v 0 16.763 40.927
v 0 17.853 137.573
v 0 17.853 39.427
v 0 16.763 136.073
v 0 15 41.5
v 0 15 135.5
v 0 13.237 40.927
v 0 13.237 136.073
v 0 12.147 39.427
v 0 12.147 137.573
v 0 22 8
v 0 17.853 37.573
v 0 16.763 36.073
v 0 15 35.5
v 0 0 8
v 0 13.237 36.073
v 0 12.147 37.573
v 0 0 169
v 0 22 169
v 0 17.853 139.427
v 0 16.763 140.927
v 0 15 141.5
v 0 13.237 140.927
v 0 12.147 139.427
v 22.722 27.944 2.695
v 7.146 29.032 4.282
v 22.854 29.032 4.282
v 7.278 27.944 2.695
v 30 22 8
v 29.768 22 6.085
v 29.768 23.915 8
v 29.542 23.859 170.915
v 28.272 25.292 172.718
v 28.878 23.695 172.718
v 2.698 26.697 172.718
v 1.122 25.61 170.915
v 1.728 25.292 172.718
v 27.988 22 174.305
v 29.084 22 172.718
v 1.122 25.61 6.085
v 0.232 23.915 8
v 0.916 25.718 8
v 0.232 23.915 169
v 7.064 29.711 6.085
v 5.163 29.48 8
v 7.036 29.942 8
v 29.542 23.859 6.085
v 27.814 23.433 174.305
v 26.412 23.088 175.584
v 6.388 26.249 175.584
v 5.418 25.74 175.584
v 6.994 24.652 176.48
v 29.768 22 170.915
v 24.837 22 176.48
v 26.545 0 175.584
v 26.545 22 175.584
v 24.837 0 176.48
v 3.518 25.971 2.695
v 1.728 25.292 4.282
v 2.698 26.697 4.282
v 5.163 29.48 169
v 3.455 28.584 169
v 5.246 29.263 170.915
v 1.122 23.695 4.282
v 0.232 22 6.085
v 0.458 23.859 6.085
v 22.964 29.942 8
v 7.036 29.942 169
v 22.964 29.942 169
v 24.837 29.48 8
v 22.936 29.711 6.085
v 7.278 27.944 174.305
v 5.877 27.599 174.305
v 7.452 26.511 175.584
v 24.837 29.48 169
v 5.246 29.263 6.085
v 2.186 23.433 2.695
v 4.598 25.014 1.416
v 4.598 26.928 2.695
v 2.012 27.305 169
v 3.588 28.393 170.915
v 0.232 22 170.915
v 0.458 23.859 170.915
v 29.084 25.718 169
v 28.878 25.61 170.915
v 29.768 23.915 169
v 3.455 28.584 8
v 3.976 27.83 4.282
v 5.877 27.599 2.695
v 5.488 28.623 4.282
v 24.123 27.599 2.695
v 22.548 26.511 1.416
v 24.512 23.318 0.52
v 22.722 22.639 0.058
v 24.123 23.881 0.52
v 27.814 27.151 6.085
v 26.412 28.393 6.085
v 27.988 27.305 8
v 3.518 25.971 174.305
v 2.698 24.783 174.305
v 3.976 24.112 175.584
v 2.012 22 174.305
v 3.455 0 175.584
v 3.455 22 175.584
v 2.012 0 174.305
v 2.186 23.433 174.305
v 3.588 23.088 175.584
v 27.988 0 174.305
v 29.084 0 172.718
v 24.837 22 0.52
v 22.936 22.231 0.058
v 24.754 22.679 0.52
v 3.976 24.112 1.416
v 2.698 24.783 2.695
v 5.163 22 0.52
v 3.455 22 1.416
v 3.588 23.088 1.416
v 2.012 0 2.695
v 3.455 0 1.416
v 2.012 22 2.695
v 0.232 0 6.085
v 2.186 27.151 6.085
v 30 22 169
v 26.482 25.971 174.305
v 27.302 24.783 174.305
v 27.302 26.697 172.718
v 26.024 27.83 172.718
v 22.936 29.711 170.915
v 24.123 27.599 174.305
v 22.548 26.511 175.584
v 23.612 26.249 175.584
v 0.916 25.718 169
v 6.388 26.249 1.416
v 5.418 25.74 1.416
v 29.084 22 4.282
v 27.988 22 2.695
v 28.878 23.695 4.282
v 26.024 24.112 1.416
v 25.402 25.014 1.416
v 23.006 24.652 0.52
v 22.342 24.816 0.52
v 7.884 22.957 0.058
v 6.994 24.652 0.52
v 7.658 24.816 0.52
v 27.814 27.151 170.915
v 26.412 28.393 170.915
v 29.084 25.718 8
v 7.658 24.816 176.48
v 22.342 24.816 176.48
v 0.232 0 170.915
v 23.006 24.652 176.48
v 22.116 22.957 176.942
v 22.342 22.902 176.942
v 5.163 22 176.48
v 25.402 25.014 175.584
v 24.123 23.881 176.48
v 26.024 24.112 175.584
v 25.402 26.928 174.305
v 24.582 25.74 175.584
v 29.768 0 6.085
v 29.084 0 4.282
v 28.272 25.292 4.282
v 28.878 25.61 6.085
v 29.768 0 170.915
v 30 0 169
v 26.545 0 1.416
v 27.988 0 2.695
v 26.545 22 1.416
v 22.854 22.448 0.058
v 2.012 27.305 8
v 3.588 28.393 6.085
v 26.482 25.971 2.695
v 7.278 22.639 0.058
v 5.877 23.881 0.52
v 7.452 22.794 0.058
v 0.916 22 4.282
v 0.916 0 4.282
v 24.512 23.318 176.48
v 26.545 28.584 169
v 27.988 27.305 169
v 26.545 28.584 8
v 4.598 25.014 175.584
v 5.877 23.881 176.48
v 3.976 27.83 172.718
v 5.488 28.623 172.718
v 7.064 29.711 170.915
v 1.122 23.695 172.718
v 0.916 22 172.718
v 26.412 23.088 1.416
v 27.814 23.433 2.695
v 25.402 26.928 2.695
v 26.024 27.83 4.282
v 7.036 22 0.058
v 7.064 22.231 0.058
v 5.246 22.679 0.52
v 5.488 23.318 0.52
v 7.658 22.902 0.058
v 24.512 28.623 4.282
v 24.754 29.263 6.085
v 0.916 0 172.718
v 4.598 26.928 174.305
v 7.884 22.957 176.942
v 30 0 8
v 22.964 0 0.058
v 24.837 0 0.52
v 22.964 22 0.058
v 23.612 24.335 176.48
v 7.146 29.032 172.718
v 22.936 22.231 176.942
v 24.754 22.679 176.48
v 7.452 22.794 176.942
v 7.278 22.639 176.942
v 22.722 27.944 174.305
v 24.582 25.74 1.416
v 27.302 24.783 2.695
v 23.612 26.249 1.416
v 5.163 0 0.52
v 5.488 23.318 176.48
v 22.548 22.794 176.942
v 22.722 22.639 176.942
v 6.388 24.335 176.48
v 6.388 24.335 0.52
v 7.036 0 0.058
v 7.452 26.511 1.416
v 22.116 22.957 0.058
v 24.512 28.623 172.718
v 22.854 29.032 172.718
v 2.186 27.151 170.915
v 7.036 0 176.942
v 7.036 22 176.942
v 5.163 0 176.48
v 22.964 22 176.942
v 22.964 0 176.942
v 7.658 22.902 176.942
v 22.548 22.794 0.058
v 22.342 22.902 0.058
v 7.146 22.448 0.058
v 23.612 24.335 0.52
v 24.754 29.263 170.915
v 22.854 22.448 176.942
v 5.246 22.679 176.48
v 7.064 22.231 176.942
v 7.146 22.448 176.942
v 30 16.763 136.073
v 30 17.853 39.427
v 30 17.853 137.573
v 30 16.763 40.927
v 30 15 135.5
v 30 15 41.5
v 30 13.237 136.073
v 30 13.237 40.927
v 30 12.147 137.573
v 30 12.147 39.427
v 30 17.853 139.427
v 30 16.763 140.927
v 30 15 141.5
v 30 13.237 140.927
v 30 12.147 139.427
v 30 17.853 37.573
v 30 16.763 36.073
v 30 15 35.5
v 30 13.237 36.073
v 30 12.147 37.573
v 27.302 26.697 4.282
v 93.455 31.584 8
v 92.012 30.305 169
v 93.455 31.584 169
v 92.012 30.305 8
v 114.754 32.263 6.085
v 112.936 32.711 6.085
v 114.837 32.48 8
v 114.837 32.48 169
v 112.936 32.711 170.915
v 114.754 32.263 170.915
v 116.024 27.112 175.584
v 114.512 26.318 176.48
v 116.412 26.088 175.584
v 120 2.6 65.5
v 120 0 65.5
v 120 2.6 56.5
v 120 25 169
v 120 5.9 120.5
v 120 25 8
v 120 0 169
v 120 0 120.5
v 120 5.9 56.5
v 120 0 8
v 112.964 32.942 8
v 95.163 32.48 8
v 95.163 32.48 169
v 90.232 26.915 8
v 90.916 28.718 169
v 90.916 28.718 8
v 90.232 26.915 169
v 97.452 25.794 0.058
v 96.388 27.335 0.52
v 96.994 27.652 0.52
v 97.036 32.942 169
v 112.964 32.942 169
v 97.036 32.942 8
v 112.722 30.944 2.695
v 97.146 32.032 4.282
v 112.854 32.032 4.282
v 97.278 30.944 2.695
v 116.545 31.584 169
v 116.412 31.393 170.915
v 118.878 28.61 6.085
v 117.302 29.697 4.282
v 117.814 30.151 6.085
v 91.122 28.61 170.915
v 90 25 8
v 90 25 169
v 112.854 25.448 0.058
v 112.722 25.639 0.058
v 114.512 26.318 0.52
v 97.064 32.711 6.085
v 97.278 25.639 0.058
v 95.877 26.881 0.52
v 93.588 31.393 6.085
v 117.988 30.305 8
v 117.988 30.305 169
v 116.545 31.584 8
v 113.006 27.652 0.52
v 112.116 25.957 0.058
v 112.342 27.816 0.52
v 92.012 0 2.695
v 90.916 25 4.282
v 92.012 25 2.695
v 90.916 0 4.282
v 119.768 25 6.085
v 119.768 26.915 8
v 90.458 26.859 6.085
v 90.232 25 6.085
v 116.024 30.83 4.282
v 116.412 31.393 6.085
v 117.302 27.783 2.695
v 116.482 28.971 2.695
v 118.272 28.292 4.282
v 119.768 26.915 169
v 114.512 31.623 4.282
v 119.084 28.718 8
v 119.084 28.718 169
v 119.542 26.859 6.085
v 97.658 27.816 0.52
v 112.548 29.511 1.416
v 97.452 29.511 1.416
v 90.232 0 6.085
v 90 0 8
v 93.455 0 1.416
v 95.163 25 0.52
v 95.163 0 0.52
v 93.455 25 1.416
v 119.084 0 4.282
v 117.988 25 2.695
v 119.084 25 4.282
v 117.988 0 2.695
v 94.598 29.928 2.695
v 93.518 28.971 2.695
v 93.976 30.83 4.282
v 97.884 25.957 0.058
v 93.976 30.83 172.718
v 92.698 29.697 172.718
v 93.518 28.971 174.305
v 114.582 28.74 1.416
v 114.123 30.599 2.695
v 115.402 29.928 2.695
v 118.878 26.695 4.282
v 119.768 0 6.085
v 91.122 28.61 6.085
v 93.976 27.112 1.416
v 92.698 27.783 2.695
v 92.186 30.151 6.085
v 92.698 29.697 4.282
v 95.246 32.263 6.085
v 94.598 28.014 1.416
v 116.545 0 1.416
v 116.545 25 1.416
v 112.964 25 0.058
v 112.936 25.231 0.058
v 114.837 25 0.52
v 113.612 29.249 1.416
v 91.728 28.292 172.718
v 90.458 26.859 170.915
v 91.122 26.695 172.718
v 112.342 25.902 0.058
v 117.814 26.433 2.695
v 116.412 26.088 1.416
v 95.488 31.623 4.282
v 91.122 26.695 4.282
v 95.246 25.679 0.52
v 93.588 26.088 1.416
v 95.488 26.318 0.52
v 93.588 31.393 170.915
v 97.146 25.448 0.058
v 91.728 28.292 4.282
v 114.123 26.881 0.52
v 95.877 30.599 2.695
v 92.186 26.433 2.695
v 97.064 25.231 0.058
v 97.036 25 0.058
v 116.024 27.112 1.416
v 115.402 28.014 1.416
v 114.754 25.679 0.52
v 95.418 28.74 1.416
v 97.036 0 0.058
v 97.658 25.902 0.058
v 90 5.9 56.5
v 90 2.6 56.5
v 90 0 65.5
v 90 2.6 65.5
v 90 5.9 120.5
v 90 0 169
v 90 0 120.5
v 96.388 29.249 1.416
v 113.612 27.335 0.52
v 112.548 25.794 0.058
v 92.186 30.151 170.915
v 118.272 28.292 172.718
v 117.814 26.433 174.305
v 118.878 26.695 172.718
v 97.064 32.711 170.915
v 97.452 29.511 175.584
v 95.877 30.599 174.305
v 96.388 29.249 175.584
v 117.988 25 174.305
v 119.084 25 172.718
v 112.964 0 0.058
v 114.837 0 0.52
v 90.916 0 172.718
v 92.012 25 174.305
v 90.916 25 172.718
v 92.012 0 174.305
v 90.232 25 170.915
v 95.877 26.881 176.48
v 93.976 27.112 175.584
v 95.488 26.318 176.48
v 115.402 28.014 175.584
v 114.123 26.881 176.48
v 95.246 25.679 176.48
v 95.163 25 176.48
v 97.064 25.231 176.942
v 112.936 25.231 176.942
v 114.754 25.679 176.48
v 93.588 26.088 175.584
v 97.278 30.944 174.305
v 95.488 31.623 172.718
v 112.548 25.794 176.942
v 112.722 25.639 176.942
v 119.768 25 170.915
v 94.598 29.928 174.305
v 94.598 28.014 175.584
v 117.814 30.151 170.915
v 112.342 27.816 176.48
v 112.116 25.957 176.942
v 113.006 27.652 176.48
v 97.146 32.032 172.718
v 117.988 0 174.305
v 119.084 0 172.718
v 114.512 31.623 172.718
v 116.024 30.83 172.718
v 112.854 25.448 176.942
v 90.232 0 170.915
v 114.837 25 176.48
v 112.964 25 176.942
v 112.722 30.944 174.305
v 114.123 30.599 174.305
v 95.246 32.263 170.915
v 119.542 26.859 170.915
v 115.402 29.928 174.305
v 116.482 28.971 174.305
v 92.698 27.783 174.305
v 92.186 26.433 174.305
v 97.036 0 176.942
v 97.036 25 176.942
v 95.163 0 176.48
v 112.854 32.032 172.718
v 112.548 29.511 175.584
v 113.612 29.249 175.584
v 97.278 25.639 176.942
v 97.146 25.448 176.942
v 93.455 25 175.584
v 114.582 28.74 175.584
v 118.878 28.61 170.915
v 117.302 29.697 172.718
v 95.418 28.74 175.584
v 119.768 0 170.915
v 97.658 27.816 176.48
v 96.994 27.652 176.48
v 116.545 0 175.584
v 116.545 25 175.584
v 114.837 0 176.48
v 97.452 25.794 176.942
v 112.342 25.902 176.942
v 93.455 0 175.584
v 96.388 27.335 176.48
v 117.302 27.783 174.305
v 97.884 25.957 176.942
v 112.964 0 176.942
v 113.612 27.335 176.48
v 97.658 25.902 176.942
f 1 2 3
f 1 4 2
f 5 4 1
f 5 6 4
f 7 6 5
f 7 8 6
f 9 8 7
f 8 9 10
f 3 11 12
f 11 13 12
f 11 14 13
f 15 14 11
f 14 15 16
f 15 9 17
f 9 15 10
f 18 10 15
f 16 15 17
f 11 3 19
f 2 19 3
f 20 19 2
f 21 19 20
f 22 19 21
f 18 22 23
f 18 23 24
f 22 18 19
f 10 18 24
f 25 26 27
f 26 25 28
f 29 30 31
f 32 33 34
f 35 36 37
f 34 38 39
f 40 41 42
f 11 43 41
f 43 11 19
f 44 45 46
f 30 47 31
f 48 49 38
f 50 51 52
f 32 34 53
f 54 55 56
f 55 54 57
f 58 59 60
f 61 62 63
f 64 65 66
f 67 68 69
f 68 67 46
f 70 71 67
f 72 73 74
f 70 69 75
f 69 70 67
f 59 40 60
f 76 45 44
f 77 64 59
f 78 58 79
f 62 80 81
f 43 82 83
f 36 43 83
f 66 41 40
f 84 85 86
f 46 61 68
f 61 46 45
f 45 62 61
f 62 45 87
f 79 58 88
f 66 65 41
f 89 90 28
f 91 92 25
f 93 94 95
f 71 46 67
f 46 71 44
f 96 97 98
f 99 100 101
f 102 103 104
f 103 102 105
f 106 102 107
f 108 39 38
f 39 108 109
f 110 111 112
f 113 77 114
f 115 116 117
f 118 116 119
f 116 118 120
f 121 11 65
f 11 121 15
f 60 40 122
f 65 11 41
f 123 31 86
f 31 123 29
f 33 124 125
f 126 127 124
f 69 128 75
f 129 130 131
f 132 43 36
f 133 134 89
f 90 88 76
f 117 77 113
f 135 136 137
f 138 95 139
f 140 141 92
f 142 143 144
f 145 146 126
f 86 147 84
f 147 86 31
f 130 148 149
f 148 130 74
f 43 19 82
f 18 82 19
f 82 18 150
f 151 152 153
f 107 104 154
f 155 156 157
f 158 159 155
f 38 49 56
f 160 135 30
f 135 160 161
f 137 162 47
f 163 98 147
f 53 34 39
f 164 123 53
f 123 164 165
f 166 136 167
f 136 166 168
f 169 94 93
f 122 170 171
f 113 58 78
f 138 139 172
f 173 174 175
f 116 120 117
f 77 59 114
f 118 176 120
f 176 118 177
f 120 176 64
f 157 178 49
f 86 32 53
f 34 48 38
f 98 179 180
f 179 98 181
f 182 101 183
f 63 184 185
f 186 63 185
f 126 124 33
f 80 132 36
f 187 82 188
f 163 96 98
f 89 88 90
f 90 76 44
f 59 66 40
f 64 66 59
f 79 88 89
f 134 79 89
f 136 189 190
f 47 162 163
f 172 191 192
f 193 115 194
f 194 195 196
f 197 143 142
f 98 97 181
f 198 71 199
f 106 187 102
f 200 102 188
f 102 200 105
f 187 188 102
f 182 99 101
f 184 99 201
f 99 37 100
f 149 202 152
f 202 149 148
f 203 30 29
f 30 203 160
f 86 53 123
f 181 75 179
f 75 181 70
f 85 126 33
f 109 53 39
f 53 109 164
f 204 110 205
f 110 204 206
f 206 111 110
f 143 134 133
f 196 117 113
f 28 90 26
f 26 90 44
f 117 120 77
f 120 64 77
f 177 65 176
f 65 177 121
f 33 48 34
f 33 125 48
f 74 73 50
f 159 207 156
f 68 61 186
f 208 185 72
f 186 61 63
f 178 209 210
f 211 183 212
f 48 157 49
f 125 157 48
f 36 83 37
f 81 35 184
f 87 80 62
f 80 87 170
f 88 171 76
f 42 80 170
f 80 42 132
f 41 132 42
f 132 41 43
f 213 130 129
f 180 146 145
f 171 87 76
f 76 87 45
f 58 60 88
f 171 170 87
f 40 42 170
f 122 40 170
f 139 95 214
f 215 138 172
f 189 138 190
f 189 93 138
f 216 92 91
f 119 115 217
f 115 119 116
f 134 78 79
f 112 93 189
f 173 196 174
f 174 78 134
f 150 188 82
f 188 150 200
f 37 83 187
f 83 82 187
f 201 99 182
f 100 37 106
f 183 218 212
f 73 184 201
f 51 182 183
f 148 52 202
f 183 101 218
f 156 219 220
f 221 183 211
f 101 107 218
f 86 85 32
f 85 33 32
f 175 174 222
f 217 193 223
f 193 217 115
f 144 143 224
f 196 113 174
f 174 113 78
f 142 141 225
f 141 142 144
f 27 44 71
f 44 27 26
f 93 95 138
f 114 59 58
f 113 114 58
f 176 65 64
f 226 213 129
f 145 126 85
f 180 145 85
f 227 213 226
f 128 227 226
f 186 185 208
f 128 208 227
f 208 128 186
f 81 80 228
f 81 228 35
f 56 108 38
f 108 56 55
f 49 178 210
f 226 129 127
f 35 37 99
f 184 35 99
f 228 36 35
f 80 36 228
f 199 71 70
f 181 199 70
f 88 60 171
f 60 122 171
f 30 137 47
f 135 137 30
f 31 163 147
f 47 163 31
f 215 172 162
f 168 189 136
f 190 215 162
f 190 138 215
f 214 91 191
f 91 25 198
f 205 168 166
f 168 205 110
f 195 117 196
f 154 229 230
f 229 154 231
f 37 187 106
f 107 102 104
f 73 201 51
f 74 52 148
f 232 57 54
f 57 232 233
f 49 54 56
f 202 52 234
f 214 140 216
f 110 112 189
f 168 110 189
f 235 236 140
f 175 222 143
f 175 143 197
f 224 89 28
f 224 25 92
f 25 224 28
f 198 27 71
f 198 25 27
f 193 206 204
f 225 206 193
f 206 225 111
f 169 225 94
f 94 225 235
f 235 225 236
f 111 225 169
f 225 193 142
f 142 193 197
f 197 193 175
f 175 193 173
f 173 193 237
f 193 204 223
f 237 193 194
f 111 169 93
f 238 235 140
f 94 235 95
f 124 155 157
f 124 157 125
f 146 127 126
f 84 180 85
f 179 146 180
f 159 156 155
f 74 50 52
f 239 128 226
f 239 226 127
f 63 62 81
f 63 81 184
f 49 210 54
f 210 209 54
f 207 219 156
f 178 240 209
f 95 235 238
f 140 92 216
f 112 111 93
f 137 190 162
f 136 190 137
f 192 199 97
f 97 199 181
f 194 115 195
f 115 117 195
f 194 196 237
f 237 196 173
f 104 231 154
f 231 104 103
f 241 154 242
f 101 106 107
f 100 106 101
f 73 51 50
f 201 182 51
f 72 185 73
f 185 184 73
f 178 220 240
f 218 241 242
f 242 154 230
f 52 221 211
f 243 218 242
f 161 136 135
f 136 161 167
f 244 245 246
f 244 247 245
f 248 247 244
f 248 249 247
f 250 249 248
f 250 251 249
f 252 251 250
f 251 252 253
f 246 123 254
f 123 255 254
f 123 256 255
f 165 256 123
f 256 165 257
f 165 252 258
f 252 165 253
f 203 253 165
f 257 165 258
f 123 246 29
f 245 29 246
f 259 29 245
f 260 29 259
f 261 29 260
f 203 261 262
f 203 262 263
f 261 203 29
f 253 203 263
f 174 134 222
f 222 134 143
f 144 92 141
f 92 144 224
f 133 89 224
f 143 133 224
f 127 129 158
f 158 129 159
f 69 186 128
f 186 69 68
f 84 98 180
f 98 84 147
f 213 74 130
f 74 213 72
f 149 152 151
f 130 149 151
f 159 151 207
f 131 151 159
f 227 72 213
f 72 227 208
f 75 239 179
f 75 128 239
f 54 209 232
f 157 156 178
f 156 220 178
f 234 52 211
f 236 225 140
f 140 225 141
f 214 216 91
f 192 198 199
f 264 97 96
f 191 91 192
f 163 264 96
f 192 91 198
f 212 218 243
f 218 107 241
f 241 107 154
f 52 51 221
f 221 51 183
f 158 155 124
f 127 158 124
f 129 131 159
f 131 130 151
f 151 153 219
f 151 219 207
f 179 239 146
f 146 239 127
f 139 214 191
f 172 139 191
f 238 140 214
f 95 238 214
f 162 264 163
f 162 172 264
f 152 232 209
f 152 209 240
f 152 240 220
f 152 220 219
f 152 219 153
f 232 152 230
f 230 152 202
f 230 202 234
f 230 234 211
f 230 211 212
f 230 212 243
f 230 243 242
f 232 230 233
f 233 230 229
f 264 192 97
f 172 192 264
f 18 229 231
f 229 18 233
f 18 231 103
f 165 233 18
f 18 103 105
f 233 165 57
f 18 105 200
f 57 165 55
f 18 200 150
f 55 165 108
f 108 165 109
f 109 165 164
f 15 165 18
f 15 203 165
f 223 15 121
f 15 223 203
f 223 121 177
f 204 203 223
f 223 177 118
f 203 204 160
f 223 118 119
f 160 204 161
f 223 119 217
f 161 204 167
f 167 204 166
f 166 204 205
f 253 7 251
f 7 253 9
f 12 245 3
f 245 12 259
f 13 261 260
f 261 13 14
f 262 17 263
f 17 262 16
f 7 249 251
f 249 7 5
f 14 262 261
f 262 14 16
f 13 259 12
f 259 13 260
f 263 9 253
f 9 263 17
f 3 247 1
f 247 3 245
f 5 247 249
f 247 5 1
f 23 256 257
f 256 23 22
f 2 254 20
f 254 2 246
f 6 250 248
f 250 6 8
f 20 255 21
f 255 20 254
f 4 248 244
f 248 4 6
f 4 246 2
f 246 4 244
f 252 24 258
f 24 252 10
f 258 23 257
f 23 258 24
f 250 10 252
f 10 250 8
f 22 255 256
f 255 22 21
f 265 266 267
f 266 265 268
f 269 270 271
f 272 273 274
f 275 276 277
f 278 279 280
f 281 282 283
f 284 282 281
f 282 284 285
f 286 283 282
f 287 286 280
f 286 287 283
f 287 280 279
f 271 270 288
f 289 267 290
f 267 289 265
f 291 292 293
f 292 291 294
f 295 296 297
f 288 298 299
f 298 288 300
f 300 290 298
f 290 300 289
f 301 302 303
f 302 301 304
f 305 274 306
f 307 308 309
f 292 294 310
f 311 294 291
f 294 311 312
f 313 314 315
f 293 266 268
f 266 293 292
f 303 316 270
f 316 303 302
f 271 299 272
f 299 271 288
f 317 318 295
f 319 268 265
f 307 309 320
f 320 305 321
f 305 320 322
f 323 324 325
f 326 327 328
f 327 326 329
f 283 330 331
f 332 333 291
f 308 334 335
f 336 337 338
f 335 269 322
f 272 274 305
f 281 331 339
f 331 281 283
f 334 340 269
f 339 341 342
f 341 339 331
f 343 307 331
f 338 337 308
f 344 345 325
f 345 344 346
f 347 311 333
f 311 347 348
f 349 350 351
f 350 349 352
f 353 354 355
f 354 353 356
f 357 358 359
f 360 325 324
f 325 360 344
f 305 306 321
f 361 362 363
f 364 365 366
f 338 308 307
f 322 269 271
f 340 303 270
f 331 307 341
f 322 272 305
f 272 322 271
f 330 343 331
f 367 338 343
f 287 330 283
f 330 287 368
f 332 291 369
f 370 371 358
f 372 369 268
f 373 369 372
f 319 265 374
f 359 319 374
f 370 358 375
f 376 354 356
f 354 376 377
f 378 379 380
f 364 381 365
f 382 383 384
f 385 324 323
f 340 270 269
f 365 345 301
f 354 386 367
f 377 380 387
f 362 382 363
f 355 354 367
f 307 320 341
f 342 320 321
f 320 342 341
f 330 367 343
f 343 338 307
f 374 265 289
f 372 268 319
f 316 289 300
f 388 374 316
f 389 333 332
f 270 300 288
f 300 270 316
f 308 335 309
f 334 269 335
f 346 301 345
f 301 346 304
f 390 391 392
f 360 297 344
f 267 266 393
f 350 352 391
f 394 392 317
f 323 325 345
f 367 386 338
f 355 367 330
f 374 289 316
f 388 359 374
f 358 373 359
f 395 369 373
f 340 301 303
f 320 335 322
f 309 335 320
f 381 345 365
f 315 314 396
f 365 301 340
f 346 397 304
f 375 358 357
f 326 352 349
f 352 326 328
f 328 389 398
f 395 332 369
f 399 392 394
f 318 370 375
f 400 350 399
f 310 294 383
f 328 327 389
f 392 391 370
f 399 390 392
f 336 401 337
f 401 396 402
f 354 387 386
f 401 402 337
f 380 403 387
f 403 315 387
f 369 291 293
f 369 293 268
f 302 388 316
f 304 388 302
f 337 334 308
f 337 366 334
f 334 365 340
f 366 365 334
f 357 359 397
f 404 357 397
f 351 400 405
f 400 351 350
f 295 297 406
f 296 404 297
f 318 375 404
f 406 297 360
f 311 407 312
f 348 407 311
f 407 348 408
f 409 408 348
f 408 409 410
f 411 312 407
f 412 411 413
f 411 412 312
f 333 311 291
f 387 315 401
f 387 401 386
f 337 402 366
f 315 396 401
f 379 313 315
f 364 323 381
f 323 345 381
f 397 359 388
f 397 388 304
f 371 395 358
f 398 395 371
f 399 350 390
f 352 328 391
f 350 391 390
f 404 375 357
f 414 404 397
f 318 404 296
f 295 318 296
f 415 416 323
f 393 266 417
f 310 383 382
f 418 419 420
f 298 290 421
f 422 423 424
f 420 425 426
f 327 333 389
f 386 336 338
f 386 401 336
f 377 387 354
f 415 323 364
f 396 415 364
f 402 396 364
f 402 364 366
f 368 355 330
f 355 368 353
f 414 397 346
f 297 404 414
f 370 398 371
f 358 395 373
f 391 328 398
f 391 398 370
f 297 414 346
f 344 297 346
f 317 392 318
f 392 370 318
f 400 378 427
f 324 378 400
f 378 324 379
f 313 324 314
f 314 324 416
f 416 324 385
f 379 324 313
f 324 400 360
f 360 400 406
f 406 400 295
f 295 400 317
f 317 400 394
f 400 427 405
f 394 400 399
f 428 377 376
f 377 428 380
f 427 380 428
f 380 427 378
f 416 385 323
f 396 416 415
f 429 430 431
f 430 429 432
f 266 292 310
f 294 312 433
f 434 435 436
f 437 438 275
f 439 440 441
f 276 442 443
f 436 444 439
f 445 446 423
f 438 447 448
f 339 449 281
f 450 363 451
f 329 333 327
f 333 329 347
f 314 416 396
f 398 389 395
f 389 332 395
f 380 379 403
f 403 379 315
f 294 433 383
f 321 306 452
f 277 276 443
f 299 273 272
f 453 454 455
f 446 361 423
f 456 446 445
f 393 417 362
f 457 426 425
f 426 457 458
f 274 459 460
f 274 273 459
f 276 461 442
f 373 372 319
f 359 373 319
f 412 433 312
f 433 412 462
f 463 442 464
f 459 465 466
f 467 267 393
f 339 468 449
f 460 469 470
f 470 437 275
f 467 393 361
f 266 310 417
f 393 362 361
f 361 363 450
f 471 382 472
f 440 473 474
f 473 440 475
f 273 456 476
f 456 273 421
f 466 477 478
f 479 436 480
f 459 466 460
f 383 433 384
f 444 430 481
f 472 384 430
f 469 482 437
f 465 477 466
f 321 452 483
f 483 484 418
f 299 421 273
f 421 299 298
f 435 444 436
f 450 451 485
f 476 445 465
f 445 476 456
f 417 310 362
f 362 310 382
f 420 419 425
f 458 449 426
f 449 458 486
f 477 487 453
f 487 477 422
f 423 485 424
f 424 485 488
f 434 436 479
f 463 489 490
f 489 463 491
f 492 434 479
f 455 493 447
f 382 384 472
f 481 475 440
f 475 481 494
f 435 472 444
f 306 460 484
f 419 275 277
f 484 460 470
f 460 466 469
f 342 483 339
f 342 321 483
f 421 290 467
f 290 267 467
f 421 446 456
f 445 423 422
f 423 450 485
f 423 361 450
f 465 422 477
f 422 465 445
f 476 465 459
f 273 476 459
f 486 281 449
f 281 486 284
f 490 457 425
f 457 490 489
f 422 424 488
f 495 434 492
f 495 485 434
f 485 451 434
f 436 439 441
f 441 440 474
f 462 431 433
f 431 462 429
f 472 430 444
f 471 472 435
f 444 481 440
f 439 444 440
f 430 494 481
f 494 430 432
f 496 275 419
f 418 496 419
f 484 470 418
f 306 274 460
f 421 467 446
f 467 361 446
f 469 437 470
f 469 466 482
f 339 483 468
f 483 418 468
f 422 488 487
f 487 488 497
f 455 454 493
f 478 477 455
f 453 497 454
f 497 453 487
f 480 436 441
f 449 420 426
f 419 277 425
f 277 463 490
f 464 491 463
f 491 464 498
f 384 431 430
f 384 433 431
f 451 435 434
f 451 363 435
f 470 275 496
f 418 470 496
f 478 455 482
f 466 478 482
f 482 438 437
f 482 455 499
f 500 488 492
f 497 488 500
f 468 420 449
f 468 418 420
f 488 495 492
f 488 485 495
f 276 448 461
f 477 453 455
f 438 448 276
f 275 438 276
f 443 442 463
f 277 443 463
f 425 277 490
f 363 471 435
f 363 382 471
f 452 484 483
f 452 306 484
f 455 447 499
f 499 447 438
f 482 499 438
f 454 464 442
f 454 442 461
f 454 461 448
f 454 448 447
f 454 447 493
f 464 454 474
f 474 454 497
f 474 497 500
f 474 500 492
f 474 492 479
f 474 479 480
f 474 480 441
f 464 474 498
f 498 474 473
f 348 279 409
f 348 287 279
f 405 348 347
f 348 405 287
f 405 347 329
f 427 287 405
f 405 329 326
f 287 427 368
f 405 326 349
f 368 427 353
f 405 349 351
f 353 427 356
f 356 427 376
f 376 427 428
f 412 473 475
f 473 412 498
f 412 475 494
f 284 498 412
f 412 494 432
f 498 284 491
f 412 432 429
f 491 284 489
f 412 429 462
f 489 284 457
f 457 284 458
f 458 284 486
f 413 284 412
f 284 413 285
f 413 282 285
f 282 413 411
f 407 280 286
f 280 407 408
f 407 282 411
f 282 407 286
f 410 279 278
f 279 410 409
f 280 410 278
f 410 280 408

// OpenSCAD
screw=6;
screw_gap=100;
x=0;
y=1;
z=2;
r=8;
front=[30,30,177];
back=front+[0,3,0];
inner=[r*2,r,r*2];
pad=0.1;
padd=pad*2;

slot=[back[x]+padd,6,64];
slot_lip=[slot[x]+padd,2.7+pad,9+pad];

raft=40;
layer_h=0.4;


module screw(z=0) {
    translate([0,front[y]/2,z])
    rotate([0,90,0])
    translate([0,0,-pad])
    cylinder(d=screw,h=front[x]+padd);
}

module screws() {
    translate([0,0,front[z]/2-screw_gap/2]) {
        screw();
        screw(screw_gap);
    }
}

module bar(vector) {
    difference(){
        translate([r,0,r])
        minkowski() {
            cube(vector-inner);
            sphere(r);
        }
        translate([0,-vector[y],0])
        cube(vector);
    }
}

module front() {
    difference(){
        bar(front);
        screws();
    }
}

module slot() {
    translate([-pad,-pad,back[z]/2-slot[z]/2])
    difference() {
        cube(slot);
        translate([-pad,-pad,-pad])
        cube(slot_lip);
    }
}

module back() {
    difference() {
        bar(back);
        slot();
    }
}

module assembled() {
    front();
    translate([front[x]*3,0,0])
    back();
}

module raft(vector) {
    minkowski() {
        cube([vector[z],vector[y],layer_h/2]);
        cylinder(r=raft,h=layer_h/2);
    }
}
module print_front() {
    $fn=90;
    translate([front[z],0,0])
    rotate([0,-90,0])
    front();
    raft(front);
}

module print_back() {
    $fn=90;
    translate([back[z],0,0])
    rotate([0,-90,0])
    back();
    raft(back);
}

display="";
if (display == "") assembled();
if (display == "case_sliders_front.stl") print_front();
if (display == "case_sliders_back.stl") print_back();
